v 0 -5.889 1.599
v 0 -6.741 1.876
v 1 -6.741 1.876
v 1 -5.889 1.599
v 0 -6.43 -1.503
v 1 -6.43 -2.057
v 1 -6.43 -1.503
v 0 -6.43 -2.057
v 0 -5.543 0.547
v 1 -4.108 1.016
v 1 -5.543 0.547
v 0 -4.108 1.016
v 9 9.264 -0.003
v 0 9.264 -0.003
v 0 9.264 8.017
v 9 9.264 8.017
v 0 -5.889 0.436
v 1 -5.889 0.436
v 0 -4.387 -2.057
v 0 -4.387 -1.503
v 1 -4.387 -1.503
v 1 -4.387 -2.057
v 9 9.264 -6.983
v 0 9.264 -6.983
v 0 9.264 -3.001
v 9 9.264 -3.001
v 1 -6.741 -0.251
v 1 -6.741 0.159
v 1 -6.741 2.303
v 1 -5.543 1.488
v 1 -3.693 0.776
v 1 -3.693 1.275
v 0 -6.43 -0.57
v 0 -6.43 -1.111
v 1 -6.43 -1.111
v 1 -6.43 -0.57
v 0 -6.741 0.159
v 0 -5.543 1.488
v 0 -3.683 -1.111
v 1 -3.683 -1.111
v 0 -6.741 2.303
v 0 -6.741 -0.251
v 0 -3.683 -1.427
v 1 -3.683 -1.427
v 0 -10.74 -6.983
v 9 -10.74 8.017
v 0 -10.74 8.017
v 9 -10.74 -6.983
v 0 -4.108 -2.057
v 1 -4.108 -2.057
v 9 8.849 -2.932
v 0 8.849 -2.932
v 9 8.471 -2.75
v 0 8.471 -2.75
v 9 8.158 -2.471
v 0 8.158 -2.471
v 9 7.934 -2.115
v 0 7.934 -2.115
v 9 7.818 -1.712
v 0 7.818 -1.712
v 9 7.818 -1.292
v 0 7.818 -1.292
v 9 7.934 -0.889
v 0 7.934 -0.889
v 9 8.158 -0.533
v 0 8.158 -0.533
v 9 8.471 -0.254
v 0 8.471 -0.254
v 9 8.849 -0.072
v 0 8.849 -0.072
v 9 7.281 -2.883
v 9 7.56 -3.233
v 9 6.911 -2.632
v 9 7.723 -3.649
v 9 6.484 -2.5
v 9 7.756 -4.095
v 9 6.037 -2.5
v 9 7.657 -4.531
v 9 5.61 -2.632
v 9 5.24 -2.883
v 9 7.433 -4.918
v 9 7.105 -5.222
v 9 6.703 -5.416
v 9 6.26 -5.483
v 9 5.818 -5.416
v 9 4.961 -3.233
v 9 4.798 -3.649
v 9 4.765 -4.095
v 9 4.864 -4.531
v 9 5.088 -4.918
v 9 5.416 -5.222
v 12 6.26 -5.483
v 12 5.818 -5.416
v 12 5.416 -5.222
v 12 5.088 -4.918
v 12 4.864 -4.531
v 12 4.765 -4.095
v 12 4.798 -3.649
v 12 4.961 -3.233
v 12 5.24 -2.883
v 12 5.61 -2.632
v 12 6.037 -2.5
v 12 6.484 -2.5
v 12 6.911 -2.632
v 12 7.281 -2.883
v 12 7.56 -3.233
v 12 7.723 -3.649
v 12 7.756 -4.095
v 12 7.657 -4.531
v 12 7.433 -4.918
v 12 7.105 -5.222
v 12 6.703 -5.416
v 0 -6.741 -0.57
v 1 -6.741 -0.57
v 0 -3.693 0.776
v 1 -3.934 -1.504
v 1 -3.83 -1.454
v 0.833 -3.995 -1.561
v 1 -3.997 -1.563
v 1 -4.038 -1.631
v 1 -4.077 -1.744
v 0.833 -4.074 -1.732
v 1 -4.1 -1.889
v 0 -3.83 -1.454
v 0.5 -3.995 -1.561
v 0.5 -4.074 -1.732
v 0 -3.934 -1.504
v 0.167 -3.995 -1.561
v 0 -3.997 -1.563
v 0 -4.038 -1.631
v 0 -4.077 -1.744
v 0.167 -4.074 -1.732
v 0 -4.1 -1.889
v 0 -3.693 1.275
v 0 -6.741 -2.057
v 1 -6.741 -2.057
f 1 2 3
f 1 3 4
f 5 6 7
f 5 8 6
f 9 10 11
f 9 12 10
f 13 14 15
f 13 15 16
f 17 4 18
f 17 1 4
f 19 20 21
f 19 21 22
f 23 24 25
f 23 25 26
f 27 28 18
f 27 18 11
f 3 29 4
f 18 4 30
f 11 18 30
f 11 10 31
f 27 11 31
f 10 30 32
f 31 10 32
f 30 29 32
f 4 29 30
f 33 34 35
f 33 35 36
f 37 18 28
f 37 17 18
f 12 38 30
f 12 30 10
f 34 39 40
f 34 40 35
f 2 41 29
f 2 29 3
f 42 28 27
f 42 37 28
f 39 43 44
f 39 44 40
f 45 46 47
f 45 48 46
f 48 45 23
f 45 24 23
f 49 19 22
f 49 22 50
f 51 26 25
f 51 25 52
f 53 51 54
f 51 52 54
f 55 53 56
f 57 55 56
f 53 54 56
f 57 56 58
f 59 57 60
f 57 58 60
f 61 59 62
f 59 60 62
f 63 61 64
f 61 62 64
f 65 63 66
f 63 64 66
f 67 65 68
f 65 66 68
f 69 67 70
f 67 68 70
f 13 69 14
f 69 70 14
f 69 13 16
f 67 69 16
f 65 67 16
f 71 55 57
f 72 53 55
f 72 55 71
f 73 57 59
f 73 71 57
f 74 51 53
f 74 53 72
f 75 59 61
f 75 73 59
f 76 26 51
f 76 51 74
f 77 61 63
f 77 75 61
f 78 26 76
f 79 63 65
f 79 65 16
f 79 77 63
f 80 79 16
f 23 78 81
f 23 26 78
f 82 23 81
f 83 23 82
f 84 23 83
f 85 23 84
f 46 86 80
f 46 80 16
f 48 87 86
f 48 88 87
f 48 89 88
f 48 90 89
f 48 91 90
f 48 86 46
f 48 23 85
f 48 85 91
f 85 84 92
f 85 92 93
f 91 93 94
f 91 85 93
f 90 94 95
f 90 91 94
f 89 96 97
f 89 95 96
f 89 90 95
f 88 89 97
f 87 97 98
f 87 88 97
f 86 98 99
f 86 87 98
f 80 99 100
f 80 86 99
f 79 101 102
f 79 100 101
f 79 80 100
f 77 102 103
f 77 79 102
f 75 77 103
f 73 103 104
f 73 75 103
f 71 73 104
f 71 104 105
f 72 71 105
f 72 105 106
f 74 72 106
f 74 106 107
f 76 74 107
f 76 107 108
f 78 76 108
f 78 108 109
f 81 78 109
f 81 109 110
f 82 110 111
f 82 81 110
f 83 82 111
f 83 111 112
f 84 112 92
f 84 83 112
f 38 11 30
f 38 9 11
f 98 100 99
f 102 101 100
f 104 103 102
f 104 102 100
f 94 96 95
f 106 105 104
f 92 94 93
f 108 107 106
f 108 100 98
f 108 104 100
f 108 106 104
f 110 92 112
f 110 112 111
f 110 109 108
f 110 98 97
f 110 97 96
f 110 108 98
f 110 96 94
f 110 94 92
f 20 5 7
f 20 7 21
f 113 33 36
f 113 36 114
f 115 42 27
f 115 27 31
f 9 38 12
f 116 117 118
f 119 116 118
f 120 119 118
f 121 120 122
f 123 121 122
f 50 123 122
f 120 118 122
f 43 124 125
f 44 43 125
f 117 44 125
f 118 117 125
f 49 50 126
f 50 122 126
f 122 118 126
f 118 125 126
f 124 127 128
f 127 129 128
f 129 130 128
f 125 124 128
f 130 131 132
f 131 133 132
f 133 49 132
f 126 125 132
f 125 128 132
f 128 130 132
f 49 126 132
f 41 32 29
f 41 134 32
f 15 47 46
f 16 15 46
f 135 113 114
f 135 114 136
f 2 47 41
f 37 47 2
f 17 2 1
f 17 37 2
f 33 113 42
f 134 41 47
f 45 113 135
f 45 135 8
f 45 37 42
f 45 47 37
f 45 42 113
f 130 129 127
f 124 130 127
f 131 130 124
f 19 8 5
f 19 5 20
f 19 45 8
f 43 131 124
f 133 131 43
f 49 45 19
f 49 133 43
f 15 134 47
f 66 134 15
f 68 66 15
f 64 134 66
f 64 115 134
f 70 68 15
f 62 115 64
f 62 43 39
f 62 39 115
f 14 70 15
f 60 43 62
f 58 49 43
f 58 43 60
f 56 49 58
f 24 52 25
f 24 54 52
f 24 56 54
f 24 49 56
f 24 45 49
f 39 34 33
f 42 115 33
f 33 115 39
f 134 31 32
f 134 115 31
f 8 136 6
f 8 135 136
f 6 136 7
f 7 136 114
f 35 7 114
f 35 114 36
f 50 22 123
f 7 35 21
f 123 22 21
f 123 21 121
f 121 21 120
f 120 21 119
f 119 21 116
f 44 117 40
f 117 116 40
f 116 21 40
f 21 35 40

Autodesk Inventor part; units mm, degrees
ref_plane "YZ Plane" through (0, 0, 0) normal (1, 0, 0) x (0, 1, 0)
ref_plane "XZ Plane" through (0, 0, 0) normal (0, 1, 0) x (-1, 0, 0)
ref_plane "XY Plane" through (0, 0, 0) normal (0, 0, 1) x (1, 0, 0)
sketch "Sketch1" plane through (0, 0, 0) normal (1, 0, 0) x (0, 1, 0)
  line L0 (10.5655, 7.5) -> (-10.5655, 7.5)
  line L1 (-10.5655, 7.5) -> (-10.5655, -6.983)
  line L2 (-10.5655, -6.983) -> (10.5655, -6.983)
  line L3 (10.5655, -6.983) -> (10.5655, 7.5)
  point P0 (0, 0)
  dimension "d0" = 21.131
  dimension "d2" = 10.5655
  dimension "d3" = 7.5
  dimension "d27" = 14.483
extrude "Extrusion1" add sketch "Sketch1" along normal blind 9
sketch "Sketch3" plane through (9, 0, 0) normal (1, 0, 0) x (0, 0, -1)
  circle A0 centre (3.983, 6.2605) radius 1.5
  point P0 (0, 0)
  dimension "d12" = 3
extrude "Extrusion3" add sketch "Sketch3" along normal blind 3
sketch "Sketch4" plane through (0, 0, 0) normal (-1, 0, 0) x (0, 0, 1)
  line L0 (-2.5186, -3.6831) -> (10.3419, -3.6831) construction
  line L1 (10.3419, -3.6831) -> (10.3419, -8.8157) construction
  line L2 (10.3419, -8.8157) -> (-2.5186, -8.8157) construction
  line L3 (-2.5186, -8.8157) -> (-2.5186, -3.6831) construction
  line L4 (-0.5697, -6.741) -> (-2.0567, -6.741)
  line L5 (-2.0567, -6.741) -> (-2.0567, -6.4297)
  line L6 (-2.0567, -6.4297) -> (-1.5034, -6.4297)
  line L7 (-1.5034, -6.4297) -> (-1.5034, -4.387)
  line L8 (-1.5034, -4.387) -> (-2.0567, -4.387)
  line L9 (-2.0567, -4.387) -> (-2.0567, -4.1079)
  spline S0 degree 2 poles (-2.0567, -4.1079) (-1.743, -4.1079) (-1.4466, -3.9301) (-1.4268, -3.6831) knots 0 0 0 1 2 2 2
  line L10 (-1.4268, -3.6831) -> (-1.1106, -3.6831)
  line L11 (-1.1106, -3.6831) -> (-1.1106, -6.4297)
  line L12 (-1.1106, -6.4297) -> (-0.5697, -6.4297)
  line L13 (-0.5697, -6.4297) -> (-0.5697, -6.741)
  line L14 (-0.2511, -6.741) -> (0.7764, -3.693)
  line L15 (0.7764, -3.693) -> (1.2754, -3.693)
  line L16 (1.2754, -3.693) -> (2.3029, -6.741)
  line L17 (2.3029, -6.741) -> (1.8756, -6.741)
  line L18 (1.8756, -6.741) -> (1.599, -5.8888)
  line L19 (1.599, -5.8888) -> (0.4356, -5.8888)
  line L20 (0.4356, -5.8888) -> (0.1589, -6.741)
  line L21 (0.1589, -6.741) -> (-0.2511, -6.741)
  line L22 (1.4878, -5.543) -> (1.016, -4.1079)
  line L23 (1.016, -4.1079) -> (0.5467, -5.543)
  line L24 (0.5467, -5.543) -> (1.4878, -5.543)
  point P0 (0, 0)
emboss "Emboss1" sketch "Sketch4" operation cut depth 1 direction (1, 0, 0)
sketch "Sketch6" plane through (0, -10.5655, -6.983) normal (0, -1, 0) x (1, 0, 0)
  line L0 (0, 14.483) -> (0, 0) projected
  line L1 (9, 14.483) -> (9, 0) projected
  line L2 (0, 0) -> (9, 0)
  line L3 (9, 0) -> (9, 14.483)
  line L4 (9, 14.483) -> (0, 14.483)
  line L5 (0, 14.483) -> (0, 0)
  point P0 (0, 6.983)
extrude "Extrusion5" add sketch "Sketch6" along normal blind 0.174
sketch "Sketch7" plane through (0, 10.5655, 7.5) normal (0, 0, 1) x (1, 0, 0)
  line L0 (0, 0) -> (9, 0) projected
  line L1 (9, 0) -> (9, -21.305) projected
  line L2 (0, 0) -> (9, 0)
  line L3 (9, 0) -> (9, -21.305)
  line L4 (9, -21.305) -> (0, -21.305)
  line L5 (0, -21.305) -> (0, 0)
  point P0 (0, -10.5655)
extrude "Extrusion6" add sketch "Sketch7" along normal blind 0.517
sketch "Sketch10" plane through (0, 10.5655, 8.017) normal (0, 1, 0) x (1, 0, 0)
  line L0 (0, 15) -> (9, 15) projected
  line L1 (9, 15) -> (9, 0) projected
  line L2 (0, 15) -> (9, 15)
  line L3 (9, 15) -> (9, 0)
  line L4 (9, 0) -> (0, 0)
  line L5 (0, 0) -> (0, 15)
  point P0 (0, 8.017)
  point P1 (9, 8.019)
  point P2 (9, 8.019)
extrude "Extrusion9" cut sketch "Sketch10" against normal blind 1.302
sketch "Sketch11" plane through (0, 0, 0) normal (-1, 0, 0) x (0, 0, 1)
  circle A0 centre (-1.502, 9.3028) radius 1.5
  line L0 (8.017, 9.2635) -> (8.017, -10.7395) projected
  point P0 (0, 0)
  dimension "d40" = 3
  dimension "d41" = 9.519
extrude "Extrusion10" cut sketch "Sketch11" against normal up to surface (9 mm away)
equation "\"d2\" = 0.5 * d0"
properties part number "Support_1A"
